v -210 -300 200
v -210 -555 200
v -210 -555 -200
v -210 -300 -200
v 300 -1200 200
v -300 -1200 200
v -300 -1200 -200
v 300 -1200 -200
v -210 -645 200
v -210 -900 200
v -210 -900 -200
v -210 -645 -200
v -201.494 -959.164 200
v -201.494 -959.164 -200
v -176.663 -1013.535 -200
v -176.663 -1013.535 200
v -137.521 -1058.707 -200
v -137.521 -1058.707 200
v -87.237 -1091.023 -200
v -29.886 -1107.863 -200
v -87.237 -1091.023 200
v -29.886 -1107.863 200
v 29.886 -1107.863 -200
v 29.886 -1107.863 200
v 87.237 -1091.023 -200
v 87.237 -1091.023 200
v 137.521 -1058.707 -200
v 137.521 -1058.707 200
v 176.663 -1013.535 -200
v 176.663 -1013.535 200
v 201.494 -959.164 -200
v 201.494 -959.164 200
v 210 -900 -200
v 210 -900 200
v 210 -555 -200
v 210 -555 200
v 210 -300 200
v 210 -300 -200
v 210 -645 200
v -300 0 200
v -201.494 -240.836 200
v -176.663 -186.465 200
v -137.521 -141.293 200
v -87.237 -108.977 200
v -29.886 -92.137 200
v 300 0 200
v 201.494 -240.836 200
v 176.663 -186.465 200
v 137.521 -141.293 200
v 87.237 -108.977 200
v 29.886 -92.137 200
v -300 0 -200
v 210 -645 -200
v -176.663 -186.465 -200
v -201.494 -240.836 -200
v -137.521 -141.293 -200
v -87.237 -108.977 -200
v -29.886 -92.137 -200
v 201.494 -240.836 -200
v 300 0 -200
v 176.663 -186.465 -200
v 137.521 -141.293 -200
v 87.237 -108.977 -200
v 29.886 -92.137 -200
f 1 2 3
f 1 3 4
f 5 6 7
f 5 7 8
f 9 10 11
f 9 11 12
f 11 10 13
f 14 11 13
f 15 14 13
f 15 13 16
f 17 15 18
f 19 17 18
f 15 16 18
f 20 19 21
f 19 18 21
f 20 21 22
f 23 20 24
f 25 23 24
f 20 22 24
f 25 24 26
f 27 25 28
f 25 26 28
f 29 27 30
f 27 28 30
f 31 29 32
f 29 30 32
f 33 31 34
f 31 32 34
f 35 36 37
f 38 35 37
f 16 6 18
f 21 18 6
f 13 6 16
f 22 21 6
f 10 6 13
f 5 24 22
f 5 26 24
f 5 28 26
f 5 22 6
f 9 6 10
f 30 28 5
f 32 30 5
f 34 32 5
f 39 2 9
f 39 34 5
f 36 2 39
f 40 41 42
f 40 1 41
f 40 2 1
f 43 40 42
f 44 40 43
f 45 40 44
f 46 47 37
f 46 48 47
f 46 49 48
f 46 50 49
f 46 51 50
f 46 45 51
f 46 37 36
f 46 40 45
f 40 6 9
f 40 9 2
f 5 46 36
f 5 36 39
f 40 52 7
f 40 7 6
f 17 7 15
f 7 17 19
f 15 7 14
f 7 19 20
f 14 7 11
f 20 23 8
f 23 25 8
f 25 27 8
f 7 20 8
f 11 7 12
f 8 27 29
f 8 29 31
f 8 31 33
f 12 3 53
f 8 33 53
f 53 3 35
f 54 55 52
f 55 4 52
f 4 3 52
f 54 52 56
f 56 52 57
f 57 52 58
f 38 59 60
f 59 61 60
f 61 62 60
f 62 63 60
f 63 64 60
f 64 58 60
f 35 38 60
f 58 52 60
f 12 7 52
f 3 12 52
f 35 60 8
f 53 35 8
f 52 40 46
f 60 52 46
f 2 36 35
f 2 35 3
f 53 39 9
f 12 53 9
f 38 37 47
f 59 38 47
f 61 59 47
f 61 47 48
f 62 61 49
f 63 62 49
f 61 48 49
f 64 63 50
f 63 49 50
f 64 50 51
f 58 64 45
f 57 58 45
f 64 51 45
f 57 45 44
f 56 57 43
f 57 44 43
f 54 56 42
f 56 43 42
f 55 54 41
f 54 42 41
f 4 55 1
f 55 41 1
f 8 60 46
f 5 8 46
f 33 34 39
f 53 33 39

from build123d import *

# Parameters (mm, degrees)
SKETCH_W     = 600
SKETCH_H     = 400
PAD_DEPTH    = 1200
POCKET_DEPTH = 400.001


with BuildPart() as part:
    # Sketch → Pad (new body)
    with BuildSketch(Plane.XZ):
        Rectangle(SKETCH_W, SKETCH_H)
    extrude(amount=PAD_DEPTH)

    # Sketch001 (on Face1 of Pad) → Pocket (cut, through all)
    with BuildSketch(Plane(origin=(0, 0, 200), x_dir=(-1, 0, 0), z_dir=(0, 0, 1))):
        with BuildLine():
            Line((-210, 900), (-210, 645))
            Line((-210, 645), (210, 645))
            Line((210, 900), (210, 645))
            ThreePointArc((210, 900), (0, 1110), (-210, 900))
        make_face()
        with BuildLine():
            ThreePointArc((-210, 300), (0, 90), (210, 300))
            Line((210, 555), (210, 300))
            Line((-210, 555), (210, 555))
            Line((-210, 555), (-210, 300))
        make_face()
    extrude(amount=-POCKET_DEPTH, mode=Mode.SUBTRACT)


solid = part.part
